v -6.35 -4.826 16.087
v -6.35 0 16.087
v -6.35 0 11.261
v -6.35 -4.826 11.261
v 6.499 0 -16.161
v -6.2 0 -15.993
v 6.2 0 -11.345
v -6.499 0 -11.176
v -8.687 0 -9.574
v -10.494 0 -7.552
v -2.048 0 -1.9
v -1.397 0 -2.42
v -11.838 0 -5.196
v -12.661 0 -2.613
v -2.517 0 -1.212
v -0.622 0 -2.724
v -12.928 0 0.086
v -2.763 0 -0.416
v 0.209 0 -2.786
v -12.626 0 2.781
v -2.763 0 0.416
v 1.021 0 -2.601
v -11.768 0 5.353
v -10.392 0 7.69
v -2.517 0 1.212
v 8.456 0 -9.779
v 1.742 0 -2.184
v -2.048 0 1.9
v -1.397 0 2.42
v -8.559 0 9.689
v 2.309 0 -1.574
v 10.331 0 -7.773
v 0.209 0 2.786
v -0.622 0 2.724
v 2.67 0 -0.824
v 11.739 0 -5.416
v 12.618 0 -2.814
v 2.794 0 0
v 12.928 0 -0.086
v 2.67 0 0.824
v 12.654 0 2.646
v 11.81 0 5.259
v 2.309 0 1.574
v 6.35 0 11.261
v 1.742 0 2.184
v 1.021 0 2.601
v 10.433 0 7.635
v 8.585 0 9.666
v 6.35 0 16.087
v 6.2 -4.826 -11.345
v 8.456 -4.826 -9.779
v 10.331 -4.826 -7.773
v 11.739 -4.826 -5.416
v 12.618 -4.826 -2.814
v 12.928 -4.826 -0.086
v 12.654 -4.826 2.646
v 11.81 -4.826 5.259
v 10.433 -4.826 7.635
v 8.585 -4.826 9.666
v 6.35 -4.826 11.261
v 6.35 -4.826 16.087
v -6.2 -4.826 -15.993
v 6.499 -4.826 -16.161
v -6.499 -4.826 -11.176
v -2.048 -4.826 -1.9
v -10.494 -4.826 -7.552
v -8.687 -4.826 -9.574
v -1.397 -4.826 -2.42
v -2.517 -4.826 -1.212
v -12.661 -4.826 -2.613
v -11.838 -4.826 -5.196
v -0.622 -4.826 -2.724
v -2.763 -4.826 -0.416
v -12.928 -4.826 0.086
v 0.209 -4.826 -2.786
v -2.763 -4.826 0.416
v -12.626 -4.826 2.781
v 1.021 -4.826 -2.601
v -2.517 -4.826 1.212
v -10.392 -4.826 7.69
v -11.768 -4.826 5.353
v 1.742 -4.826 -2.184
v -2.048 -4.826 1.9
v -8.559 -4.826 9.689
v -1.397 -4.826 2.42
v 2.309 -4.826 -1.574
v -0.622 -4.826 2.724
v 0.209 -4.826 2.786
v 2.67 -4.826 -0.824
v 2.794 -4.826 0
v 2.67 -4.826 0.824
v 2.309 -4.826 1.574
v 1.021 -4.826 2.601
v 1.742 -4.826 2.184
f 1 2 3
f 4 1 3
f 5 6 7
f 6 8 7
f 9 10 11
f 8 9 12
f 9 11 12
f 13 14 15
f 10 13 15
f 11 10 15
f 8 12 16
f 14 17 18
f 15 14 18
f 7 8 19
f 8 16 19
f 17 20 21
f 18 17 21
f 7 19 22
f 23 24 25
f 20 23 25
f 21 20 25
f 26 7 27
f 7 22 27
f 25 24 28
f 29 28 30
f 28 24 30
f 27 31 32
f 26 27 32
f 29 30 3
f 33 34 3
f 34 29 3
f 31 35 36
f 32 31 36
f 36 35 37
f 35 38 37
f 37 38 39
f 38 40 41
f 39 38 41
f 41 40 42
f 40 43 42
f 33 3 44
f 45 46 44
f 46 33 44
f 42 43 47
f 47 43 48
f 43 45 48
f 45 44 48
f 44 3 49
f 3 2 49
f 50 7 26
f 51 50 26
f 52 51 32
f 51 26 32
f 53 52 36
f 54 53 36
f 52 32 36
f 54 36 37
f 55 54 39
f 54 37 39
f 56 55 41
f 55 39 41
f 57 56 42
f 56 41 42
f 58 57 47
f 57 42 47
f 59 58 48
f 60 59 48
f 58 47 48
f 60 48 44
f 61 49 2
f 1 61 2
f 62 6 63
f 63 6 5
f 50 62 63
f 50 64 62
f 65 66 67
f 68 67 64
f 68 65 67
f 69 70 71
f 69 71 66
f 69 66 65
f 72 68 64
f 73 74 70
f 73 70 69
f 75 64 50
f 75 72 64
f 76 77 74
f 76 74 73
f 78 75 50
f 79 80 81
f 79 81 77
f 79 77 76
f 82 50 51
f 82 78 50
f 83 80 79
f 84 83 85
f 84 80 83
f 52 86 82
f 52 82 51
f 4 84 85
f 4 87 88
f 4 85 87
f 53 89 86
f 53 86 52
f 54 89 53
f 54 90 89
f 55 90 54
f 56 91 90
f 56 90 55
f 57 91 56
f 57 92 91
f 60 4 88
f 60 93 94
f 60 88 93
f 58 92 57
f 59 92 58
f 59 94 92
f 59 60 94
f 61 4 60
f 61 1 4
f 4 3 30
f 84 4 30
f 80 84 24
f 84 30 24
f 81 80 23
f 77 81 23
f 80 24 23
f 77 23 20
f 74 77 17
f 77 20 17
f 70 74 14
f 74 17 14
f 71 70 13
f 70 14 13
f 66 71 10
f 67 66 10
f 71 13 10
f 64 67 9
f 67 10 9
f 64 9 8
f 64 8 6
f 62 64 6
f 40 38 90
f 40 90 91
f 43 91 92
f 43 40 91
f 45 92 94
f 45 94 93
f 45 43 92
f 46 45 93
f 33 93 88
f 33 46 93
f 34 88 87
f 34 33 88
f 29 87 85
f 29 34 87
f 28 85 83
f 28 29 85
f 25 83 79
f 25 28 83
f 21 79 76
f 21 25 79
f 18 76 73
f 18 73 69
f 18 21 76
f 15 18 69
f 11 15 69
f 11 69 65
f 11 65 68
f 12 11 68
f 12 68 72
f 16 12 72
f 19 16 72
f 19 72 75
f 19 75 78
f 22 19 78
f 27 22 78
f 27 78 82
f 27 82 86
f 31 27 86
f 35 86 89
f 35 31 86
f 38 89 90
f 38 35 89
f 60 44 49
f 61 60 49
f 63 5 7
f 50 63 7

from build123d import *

# Parameters (mm, degrees)
F0_R     = 2.794
F1_DEPTH = 4.826


with BuildPart() as f1:
    # F0 (on Front) → F1 (new body)
    with BuildSketch(Plane.XZ):
        with BuildLine():
            Line((-6.199785, -15.992633), (6.499093, -16.161406))
            Line((6.499093, -16.161406), (6.199785, -11.344696))
            ThreePointArc((6.199785, -11.344696), (12.927958, -0.085905), (6.35, 11.261304))
            Line((6.35, 11.261304), (6.35, 16.087304))
            Line((6.35, 16.087304), (-6.35, 16.087304))
            Line((-6.35, 16.087304), (-6.35, 11.261304))
            ThreePointArc((-6.35, 11.261304), (-12.927958, 0.085905), (-6.499093, -11.175923))
            Line((-6.499093, -11.175923), (-6.199785, -15.992633))
        make_face()
        Circle(F0_R, mode=Mode.SUBTRACT)
    extrude(amount=F1_DEPTH)


solid = f1.part
